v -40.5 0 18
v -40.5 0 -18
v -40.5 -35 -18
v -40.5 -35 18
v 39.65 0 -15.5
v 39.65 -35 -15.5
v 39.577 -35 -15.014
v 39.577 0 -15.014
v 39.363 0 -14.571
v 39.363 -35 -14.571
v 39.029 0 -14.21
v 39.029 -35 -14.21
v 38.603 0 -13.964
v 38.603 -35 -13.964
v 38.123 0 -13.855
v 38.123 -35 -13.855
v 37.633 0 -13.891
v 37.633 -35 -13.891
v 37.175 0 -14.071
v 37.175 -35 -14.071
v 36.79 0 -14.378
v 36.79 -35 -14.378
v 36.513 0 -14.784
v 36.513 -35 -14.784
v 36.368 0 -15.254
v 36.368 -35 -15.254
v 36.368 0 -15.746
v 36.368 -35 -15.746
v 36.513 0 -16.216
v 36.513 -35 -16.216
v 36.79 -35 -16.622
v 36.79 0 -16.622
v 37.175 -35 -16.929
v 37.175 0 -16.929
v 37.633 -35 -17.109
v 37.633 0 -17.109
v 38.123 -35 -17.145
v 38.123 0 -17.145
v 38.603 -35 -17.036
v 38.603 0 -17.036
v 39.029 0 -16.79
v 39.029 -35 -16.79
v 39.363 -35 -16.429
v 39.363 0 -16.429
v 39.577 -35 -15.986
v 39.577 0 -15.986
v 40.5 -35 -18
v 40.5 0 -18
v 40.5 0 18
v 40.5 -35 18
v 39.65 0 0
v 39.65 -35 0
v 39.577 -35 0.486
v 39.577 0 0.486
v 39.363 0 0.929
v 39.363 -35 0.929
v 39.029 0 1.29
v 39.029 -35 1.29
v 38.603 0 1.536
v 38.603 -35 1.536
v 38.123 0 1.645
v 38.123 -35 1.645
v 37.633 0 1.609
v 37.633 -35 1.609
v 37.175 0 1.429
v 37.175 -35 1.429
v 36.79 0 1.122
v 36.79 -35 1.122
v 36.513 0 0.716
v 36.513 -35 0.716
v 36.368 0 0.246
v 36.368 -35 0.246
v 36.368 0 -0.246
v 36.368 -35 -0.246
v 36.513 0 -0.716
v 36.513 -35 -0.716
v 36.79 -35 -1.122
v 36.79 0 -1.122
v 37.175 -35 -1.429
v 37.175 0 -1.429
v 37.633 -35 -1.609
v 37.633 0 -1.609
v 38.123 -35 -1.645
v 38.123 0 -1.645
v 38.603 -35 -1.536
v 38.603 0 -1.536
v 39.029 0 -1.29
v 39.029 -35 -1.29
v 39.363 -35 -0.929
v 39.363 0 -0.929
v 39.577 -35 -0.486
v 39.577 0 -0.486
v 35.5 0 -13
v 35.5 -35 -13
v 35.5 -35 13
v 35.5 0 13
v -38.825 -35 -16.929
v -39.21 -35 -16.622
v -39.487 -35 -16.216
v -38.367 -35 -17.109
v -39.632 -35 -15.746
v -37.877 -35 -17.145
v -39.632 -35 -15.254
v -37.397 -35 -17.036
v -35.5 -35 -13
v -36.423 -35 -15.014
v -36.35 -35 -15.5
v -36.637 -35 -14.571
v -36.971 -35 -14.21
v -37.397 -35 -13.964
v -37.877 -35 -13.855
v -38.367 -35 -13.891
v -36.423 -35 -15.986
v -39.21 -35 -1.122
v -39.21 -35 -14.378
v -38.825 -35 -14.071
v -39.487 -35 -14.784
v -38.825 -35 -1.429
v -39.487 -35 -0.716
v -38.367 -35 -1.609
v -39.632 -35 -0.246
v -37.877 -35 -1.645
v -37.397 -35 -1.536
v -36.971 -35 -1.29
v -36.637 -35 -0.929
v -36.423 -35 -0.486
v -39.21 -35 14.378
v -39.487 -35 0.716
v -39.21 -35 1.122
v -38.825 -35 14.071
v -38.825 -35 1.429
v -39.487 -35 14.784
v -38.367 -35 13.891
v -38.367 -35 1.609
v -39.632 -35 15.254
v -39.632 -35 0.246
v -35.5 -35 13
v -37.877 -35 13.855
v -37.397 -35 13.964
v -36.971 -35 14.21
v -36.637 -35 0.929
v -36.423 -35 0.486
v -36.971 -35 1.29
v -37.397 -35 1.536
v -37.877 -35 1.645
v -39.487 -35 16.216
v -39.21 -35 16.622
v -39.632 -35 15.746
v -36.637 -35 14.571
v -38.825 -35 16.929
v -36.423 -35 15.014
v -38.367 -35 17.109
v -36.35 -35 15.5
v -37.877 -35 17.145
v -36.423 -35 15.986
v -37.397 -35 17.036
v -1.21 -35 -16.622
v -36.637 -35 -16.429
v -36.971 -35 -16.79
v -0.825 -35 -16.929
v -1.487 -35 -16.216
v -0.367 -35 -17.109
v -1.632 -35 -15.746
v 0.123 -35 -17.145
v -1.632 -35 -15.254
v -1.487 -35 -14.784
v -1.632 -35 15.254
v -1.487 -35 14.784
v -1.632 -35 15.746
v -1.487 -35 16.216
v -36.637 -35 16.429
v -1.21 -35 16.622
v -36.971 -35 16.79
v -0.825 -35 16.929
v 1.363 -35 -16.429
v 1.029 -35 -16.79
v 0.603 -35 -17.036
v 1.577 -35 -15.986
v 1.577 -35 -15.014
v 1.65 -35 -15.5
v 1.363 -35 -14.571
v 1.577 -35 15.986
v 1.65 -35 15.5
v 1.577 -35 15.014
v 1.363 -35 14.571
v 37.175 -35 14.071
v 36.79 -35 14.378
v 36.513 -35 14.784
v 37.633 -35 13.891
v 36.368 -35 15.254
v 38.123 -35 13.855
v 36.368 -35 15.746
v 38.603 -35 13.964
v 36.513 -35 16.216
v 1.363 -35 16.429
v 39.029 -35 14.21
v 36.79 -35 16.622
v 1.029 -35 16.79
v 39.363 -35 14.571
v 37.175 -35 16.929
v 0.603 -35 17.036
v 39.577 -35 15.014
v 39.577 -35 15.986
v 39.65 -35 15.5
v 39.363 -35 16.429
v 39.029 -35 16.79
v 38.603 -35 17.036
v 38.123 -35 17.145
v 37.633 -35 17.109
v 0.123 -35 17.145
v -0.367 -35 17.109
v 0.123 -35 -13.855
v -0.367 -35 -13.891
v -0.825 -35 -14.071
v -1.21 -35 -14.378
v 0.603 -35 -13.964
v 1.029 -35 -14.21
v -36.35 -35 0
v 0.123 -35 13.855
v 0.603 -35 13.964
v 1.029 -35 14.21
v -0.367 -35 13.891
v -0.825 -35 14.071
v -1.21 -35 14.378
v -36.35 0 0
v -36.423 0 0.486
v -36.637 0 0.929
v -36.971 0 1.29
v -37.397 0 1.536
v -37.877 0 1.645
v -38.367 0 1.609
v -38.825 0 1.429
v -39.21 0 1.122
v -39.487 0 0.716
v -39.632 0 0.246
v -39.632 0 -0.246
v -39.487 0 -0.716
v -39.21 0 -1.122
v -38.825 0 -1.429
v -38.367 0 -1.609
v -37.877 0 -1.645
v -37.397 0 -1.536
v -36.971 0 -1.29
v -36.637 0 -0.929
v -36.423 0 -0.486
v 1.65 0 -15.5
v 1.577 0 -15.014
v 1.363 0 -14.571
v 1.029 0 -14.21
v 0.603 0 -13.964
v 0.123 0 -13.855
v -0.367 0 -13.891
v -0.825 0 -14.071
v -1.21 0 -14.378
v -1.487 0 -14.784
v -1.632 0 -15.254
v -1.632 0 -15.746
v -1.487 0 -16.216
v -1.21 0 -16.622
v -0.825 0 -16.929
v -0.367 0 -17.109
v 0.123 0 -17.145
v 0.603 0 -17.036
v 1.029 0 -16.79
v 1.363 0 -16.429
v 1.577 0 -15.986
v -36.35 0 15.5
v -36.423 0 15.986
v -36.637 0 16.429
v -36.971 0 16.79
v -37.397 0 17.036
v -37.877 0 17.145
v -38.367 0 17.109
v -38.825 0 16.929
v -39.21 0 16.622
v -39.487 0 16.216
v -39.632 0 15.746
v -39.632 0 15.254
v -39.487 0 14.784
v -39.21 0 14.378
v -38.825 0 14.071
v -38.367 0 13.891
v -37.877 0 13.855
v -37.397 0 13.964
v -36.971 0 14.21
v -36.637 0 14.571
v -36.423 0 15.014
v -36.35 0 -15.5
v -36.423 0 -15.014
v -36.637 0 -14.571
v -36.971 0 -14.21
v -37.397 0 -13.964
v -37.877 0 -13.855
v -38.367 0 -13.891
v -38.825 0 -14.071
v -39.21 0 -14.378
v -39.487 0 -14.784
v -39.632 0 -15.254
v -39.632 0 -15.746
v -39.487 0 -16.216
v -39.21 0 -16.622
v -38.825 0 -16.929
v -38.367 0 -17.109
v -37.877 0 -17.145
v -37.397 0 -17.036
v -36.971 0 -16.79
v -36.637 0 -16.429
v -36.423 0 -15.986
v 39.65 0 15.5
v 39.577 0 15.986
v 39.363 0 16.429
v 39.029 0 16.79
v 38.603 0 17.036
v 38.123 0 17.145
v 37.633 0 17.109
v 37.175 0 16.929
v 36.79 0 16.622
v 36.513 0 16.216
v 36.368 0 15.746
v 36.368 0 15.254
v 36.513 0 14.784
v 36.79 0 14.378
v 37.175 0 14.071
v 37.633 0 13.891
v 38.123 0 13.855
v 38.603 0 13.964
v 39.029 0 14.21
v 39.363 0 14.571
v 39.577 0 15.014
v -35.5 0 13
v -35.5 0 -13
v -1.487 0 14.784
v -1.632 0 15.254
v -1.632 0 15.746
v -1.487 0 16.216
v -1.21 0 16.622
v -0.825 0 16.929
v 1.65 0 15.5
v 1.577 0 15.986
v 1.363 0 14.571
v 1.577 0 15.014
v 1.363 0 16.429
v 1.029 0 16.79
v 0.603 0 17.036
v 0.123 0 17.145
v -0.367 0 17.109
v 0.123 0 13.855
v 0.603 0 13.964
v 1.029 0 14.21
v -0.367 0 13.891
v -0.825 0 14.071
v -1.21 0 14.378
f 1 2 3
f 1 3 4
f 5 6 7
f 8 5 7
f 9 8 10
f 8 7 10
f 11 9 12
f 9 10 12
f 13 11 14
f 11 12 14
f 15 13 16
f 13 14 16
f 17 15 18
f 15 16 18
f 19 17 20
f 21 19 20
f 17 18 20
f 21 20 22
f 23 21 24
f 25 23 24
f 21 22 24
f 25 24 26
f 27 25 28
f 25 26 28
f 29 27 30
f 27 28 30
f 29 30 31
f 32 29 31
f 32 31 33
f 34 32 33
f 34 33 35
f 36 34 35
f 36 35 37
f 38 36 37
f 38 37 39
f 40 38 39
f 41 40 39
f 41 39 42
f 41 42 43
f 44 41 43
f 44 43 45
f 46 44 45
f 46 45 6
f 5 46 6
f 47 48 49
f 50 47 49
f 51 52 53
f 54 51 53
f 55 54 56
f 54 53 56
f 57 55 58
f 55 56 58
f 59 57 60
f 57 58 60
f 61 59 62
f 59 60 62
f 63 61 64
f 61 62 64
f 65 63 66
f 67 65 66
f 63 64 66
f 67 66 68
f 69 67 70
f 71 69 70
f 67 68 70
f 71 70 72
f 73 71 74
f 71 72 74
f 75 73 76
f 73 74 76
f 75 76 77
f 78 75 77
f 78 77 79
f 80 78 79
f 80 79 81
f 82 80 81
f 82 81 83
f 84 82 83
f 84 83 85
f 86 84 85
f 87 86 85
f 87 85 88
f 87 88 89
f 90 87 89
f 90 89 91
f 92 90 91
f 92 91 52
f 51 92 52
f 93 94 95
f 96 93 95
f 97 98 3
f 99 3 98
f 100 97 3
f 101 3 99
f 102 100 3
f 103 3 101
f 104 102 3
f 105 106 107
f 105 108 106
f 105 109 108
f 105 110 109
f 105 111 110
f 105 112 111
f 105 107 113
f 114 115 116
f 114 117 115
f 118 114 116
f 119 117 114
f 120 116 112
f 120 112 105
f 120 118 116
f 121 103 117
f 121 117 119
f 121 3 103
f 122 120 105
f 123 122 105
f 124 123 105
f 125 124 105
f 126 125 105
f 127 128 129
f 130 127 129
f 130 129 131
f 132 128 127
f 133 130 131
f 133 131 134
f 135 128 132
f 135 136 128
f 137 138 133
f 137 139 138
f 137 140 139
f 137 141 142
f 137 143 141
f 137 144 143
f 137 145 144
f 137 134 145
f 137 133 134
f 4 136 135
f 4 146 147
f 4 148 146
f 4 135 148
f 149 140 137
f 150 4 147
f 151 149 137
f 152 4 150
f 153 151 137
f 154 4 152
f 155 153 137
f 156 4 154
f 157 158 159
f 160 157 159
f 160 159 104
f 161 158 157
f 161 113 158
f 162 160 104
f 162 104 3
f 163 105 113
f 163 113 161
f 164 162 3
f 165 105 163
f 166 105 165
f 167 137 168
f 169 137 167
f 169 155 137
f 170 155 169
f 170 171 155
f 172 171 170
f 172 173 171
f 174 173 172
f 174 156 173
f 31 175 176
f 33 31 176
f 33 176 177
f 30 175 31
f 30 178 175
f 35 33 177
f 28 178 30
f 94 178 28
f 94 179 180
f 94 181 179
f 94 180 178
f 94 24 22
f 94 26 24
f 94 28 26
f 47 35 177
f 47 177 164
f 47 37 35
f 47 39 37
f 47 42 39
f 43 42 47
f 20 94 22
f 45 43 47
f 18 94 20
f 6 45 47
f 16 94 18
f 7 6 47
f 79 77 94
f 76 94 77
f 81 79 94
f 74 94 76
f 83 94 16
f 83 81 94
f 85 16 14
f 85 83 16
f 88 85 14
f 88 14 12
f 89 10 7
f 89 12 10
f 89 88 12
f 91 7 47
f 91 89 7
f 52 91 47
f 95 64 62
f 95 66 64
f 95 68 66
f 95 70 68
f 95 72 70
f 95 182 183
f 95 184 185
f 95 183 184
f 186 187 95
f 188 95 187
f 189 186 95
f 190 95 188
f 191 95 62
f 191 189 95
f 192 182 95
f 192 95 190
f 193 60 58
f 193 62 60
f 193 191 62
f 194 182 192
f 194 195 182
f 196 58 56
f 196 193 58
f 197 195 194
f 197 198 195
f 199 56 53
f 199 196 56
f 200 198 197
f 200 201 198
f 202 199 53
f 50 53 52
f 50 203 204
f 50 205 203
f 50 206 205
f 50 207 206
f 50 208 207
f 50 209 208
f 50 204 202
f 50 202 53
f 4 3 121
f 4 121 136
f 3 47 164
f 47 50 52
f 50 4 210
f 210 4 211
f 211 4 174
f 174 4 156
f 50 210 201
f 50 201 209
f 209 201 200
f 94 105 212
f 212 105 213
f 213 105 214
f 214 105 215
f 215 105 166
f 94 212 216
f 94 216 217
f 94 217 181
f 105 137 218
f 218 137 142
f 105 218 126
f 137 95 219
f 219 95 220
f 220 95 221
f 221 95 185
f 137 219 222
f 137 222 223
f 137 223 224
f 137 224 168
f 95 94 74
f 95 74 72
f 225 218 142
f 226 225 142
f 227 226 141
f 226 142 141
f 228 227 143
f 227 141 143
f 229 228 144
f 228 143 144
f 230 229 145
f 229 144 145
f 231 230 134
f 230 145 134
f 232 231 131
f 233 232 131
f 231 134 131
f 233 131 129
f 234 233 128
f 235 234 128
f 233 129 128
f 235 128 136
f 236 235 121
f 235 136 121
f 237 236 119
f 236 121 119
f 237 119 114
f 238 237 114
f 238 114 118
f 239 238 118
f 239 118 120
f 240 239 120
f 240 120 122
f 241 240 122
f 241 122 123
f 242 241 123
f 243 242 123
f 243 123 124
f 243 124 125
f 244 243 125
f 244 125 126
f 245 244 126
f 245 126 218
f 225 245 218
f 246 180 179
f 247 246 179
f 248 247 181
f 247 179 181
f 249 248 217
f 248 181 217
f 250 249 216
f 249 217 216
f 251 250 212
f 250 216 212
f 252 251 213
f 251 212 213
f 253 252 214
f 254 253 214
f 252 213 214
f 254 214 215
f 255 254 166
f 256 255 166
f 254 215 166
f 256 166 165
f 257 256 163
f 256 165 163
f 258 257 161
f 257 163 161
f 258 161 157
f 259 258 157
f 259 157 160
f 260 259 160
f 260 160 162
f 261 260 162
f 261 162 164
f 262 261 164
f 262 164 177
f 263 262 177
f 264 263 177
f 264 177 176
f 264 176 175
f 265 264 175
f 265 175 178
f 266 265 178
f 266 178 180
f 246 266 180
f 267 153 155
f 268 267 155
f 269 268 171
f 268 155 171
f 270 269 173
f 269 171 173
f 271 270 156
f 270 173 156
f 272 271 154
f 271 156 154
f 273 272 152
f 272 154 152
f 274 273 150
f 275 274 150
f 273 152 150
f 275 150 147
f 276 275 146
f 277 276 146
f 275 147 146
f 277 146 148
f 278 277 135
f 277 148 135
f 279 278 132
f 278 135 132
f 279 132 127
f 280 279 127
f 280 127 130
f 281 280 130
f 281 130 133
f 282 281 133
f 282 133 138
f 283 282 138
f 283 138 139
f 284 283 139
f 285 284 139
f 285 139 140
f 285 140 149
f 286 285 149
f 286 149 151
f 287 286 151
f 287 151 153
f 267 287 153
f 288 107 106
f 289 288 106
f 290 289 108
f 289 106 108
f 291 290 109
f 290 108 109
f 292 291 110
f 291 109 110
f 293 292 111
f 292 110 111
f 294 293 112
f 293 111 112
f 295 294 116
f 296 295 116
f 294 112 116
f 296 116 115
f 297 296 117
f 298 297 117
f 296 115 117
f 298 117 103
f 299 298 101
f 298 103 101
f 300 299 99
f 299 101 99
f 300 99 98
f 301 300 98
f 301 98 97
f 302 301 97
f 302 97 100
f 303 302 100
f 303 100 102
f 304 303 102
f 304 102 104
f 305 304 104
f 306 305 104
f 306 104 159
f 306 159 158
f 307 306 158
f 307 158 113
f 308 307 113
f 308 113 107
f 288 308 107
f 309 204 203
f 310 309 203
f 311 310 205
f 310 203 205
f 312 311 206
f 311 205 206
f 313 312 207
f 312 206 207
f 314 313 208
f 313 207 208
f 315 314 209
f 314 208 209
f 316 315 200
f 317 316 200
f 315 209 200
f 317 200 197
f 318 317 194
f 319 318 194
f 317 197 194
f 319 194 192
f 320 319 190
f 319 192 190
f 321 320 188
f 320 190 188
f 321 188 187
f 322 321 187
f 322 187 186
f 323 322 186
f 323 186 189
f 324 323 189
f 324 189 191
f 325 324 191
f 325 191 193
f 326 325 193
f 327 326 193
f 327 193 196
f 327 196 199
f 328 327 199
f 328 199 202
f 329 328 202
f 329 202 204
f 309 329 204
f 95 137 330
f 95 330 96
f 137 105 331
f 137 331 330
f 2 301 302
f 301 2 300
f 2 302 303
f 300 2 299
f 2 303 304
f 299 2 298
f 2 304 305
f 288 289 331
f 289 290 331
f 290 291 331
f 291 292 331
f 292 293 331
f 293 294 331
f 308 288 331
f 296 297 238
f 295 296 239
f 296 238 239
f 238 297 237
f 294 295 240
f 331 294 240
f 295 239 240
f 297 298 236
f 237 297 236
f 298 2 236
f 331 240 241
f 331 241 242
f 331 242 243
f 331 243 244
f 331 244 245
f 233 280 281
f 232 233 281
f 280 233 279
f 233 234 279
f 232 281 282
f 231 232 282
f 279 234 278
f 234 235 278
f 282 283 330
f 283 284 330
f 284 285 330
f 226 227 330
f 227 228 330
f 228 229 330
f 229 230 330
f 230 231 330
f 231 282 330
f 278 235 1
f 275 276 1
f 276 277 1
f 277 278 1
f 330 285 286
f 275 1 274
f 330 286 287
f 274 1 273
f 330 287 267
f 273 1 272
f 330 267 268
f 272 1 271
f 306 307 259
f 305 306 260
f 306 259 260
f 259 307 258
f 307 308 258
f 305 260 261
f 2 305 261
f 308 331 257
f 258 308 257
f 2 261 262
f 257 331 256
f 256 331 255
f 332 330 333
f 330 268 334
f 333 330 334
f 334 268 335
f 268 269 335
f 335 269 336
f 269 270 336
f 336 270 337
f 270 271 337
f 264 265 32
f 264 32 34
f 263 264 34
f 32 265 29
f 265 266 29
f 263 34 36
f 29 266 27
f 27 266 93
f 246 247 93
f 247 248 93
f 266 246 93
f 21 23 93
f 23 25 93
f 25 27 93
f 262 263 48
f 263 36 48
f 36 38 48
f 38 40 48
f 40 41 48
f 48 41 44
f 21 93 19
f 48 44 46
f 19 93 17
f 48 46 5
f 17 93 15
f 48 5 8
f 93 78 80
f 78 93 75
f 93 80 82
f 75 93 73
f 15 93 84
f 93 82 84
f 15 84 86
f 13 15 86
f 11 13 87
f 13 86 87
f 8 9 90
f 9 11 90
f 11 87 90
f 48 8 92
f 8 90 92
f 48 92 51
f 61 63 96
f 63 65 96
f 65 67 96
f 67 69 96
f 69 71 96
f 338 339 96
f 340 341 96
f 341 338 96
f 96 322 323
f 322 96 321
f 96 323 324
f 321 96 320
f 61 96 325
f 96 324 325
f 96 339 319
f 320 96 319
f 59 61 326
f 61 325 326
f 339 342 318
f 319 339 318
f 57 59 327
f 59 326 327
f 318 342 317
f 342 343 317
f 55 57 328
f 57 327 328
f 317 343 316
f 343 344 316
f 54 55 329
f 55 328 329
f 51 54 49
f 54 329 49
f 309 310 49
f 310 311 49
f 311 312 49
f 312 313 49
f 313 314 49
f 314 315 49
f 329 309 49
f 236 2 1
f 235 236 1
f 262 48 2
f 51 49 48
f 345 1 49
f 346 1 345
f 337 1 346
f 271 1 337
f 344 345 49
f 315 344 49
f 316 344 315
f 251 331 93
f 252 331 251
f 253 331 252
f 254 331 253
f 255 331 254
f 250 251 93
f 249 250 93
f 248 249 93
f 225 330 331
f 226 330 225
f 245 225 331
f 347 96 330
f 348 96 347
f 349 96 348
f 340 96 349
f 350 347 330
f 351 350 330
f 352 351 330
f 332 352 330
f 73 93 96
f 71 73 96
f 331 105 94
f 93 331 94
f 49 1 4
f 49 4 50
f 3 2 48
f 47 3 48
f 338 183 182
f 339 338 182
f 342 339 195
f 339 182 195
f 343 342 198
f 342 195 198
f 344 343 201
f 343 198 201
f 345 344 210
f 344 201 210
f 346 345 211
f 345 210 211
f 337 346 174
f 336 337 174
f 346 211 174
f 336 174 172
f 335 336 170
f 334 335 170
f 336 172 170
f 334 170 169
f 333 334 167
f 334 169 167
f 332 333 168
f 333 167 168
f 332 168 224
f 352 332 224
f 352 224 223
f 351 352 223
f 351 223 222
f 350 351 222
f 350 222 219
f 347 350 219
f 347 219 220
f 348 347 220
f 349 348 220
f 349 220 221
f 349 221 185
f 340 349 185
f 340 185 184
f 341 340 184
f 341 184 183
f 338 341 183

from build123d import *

# Parameters (mm, degrees)
F0_W     = 81
F0_H     = 36
F1_DEPTH = 35
F2_W     = 71
F2_H     = 26
F3_DEPTH = 35.001
F4_R     = 1.65
F5_DEPTH = 35.001


with BuildPart() as f1:
    # F0 (on Front) → F1 (new body)
    with BuildSketch(Plane.XZ):
        Rectangle(F0_W, F0_H)
    extrude(amount=F1_DEPTH)

    # F2 (on face) → F3 (cut, through all)
    with BuildSketch(Plane.XZ.offset(35)):
        Rectangle(F2_W, F2_H)
    extrude(amount=-F3_DEPTH, mode=Mode.SUBTRACT)

    # F4 (on face) → F5 (cut, through all)
    with BuildSketch(Plane.XZ.offset(35)):
        with Locations((0, 15.5)):
            Circle(F4_R)
        with Locations((38, 15.5)):
            Circle(F4_R)
        with Locations((38, 0)):
            Circle(F4_R)
        with Locations((38, -15.5)):
            Circle(F4_R)
        with Locations((0, -15.5)):
            Circle(F4_R)
        with Locations((-38, -15.5)):
            Circle(F4_R)
        with Locations((-38, 0)):
            Circle(F4_R)
        with Locations((-38, 15.5)):
            Circle(F4_R)
    extrude(amount=-F5_DEPTH, mode=Mode.SUBTRACT)


solid = f1.part
